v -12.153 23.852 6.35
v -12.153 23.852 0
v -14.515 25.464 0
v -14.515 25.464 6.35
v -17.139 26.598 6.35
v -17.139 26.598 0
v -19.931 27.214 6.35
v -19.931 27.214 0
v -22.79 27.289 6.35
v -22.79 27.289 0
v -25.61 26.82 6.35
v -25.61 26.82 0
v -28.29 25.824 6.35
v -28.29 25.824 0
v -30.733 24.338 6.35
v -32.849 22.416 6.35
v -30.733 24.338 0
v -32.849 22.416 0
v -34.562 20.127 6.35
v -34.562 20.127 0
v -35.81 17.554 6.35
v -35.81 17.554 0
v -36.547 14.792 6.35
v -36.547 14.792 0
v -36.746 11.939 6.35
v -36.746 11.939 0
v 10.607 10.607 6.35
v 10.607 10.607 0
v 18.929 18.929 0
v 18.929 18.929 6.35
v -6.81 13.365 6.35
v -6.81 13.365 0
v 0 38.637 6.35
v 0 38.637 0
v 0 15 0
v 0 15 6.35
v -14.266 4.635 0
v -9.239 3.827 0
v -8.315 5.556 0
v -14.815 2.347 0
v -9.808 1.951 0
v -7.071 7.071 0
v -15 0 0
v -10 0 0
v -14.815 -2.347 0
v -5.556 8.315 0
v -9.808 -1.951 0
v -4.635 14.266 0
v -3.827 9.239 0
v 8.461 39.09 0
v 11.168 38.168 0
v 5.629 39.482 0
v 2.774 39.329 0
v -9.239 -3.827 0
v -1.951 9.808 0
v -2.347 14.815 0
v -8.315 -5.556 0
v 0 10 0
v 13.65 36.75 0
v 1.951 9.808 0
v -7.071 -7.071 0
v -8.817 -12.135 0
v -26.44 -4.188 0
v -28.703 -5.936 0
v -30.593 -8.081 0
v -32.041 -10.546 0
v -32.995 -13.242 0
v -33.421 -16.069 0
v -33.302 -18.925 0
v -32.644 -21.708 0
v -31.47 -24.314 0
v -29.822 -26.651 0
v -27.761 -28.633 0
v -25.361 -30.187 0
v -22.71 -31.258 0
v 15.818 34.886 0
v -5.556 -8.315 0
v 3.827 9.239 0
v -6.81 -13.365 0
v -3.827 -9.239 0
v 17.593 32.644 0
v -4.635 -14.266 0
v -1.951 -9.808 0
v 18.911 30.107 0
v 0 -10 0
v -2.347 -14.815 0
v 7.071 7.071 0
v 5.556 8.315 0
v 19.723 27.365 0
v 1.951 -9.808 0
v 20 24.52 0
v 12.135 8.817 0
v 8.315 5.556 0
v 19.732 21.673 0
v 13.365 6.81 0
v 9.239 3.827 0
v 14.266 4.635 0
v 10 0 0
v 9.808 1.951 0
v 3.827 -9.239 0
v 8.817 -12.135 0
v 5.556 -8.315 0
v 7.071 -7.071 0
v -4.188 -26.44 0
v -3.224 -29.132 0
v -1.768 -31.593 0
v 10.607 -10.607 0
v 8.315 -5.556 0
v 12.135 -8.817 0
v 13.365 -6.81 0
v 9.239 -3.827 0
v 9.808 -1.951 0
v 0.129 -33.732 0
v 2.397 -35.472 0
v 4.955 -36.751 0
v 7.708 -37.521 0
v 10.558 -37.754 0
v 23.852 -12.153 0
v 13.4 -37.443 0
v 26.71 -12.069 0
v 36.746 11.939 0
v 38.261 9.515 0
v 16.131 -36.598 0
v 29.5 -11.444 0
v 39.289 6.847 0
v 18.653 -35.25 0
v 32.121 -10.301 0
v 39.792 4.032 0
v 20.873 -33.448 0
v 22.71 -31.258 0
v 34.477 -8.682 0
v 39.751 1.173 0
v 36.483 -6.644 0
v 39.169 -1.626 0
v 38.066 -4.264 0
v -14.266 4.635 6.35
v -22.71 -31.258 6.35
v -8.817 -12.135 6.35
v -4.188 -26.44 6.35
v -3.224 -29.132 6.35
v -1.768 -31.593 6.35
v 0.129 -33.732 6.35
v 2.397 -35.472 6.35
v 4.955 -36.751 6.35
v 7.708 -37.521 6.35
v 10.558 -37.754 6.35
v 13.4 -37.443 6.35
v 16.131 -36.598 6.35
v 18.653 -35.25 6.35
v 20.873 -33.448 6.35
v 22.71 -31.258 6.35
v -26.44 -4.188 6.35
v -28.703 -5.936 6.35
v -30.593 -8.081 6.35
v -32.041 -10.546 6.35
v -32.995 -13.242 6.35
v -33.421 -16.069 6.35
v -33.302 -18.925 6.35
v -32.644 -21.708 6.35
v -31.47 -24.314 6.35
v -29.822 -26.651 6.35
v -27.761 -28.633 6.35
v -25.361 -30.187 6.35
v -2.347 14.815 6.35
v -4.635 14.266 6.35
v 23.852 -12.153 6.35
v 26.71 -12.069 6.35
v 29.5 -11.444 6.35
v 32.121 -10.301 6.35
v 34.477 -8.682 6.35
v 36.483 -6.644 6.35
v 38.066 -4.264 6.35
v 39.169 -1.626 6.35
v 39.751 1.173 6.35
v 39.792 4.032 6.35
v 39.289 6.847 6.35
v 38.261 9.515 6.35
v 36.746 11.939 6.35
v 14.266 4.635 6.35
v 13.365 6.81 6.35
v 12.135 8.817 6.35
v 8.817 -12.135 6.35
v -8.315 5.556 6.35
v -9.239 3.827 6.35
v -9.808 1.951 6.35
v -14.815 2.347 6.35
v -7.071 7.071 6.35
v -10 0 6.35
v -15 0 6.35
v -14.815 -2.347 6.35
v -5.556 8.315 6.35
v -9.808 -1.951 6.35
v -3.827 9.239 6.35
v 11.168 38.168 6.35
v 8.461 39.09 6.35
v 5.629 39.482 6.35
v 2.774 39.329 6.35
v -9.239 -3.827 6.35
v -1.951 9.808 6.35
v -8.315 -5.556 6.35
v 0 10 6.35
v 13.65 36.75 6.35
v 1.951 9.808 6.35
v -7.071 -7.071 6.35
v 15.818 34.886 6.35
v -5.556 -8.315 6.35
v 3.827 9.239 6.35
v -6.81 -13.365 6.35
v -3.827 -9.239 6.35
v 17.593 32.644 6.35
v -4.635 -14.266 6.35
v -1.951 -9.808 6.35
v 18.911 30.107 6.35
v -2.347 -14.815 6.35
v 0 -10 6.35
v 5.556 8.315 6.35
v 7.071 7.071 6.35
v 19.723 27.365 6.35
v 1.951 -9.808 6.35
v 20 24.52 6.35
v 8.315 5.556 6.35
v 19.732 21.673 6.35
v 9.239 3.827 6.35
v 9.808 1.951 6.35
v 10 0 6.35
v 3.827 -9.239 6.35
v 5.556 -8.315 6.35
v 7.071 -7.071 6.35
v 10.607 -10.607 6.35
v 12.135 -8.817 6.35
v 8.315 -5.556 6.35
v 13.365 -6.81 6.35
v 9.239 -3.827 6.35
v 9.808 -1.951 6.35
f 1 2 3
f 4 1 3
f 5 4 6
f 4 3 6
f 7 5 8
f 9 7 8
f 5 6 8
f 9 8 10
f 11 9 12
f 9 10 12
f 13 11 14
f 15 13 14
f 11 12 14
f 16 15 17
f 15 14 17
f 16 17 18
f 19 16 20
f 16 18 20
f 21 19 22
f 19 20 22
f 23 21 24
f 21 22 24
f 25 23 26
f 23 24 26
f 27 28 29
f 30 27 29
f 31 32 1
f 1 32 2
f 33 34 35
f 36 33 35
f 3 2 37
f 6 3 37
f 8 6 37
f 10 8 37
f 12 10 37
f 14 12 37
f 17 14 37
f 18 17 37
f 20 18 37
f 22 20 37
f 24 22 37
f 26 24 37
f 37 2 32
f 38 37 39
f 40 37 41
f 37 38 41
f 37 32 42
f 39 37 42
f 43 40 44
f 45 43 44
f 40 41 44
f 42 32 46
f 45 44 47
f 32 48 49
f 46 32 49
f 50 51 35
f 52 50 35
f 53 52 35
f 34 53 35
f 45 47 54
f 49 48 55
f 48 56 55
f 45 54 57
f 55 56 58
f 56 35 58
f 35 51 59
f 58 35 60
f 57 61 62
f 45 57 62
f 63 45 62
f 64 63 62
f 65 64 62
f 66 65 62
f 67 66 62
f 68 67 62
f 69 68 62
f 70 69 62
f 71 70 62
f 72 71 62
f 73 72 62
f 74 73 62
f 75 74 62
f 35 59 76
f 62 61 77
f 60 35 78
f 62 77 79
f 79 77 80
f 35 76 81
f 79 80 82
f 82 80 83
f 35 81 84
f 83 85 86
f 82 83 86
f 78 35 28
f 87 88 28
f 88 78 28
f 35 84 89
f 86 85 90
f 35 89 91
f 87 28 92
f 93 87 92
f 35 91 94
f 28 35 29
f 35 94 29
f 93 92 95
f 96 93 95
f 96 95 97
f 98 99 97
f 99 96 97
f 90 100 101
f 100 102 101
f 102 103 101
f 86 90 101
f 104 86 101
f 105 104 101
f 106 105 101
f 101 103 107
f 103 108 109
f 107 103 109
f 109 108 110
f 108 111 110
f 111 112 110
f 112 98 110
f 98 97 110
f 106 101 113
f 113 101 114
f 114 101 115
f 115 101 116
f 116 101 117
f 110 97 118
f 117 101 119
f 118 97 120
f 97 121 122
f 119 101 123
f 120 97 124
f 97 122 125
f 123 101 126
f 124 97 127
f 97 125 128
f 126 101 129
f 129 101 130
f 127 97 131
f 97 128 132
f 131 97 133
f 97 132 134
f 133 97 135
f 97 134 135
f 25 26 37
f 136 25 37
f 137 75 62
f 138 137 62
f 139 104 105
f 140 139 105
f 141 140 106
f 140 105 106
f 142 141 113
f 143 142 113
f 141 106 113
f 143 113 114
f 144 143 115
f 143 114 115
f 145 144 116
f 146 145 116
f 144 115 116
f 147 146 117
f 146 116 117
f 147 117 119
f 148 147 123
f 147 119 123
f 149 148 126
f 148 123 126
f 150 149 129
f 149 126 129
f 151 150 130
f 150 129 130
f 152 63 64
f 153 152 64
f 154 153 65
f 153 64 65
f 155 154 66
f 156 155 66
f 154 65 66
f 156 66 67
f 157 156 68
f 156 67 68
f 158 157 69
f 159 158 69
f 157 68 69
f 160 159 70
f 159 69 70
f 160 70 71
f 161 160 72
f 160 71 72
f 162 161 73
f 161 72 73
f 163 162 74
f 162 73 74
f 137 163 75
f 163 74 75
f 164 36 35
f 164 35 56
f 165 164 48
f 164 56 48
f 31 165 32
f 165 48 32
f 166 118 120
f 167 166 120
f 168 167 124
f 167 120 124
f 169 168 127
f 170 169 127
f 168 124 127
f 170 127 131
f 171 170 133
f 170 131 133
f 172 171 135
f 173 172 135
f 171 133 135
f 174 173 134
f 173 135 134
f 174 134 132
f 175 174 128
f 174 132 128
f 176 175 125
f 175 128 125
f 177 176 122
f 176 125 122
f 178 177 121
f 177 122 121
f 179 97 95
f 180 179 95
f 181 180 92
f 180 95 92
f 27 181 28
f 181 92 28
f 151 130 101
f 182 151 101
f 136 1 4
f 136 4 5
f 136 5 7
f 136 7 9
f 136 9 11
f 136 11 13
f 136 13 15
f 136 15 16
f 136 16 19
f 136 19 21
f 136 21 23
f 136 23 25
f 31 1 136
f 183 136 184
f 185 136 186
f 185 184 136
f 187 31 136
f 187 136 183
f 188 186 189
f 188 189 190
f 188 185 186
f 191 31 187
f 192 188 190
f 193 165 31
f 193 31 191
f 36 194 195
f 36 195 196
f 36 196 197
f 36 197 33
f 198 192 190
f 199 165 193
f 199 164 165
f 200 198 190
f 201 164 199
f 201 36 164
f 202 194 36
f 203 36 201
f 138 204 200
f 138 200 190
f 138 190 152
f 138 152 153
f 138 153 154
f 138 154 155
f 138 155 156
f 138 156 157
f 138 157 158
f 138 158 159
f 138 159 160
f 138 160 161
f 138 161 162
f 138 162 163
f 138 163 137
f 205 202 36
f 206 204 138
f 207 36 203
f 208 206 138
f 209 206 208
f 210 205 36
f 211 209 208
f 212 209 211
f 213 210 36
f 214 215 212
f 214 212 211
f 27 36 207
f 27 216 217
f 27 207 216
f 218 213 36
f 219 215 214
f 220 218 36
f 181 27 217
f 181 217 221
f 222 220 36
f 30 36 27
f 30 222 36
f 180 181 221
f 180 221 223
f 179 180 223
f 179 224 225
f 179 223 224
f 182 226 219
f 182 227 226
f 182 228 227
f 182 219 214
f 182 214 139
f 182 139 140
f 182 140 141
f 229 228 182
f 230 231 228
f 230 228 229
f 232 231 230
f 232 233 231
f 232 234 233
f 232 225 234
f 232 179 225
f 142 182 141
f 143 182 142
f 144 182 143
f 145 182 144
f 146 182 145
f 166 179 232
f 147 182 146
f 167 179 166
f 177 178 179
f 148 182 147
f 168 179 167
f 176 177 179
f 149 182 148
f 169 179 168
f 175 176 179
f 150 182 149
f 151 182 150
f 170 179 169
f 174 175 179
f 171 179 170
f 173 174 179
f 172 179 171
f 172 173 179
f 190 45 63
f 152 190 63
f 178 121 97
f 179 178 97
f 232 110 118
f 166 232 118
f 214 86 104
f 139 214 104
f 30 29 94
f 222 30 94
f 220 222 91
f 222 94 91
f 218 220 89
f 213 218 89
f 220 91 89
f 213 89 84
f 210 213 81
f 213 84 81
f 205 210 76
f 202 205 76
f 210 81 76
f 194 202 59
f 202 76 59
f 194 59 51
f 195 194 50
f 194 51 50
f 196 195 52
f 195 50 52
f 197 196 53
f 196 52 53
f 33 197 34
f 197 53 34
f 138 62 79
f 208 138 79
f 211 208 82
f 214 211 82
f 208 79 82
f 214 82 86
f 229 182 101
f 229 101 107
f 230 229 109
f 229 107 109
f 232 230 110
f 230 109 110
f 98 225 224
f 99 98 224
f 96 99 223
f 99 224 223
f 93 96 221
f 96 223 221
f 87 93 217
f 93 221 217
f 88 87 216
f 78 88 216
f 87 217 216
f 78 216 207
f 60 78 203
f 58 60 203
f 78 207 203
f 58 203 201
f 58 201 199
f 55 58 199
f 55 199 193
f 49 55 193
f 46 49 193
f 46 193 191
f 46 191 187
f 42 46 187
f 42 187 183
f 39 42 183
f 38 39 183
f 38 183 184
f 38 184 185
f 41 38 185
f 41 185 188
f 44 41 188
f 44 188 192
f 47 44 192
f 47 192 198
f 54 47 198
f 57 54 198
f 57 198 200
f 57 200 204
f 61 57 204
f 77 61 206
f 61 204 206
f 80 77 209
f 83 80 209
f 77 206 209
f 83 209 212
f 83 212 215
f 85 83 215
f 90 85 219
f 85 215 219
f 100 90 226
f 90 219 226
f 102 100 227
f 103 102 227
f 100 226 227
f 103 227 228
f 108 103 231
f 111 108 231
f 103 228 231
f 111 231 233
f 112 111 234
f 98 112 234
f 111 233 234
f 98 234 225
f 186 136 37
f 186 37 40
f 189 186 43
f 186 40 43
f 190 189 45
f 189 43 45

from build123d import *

# Parameters (mm, degrees)
F1_DEPTH = 6.35
F2_COUNT = 5
F3_R     = 15
F4_DEPTH = 6.35
F5_R     = 10
F6_DEPTH = 6.351


with BuildPart() as f1:
    # F0 (on Top) → F1 (new body)
    with BuildSketch(Plane.XY):
        with BuildLine():
            Line((0, 38.637033), (0, 0))
            Line((0, 0), (18.929224, 18.929224))
            ThreePointArc((18.929224, 18.929224), (15.818142, 34.885653), (0, 38.637033))
        make_face()
    extrude(amount=F1_DEPTH)



with BuildPart() as f2_1:
    # F2: instance of F1
    add(f1.part.rotate(Axis((0, 0, 3.175), (0, 0, 1)), 1 * 360 / F2_COUNT))


with BuildPart() as f2_2:
    # F2: instance of F1
    add(f1.part.rotate(Axis((0, 0, 3.175), (0, 0, 1)), 2 * 360 / F2_COUNT))


with BuildPart() as f2_3:
    # F2: instance of F1
    add(f1.part.rotate(Axis((0, 0, 3.175), (0, 0, 1)), 3 * 360 / F2_COUNT))


with BuildPart() as f2_4:
    # F2: instance of F1
    add(f1.part.rotate(Axis((0, 0, 3.175), (0, 0, 1)), 4 * 360 / F2_COUNT))


with BuildPart() as f1_1:
    add(f1.part)

    add(f2_1.part)  # F4 merges F2_1

    add(f2_2.part)  # F4 merges F2_2

    add(f2_3.part)  # F4 merges F2_3

    add(f2_4.part)  # F4 merges F2_4
    # F3 (on Top) → F4 (join, through all)
    with BuildSketch(Plane.XY):
        Circle(F3_R)
    extrude(amount=F4_DEPTH)

    # F5 (on face) → F6 (cut, through all)
    with BuildSketch(Plane.XY.offset(6.35)):
        Circle(F5_R)
    extrude(amount=-F6_DEPTH, mode=Mode.SUBTRACT)


solid = f1_1.part
